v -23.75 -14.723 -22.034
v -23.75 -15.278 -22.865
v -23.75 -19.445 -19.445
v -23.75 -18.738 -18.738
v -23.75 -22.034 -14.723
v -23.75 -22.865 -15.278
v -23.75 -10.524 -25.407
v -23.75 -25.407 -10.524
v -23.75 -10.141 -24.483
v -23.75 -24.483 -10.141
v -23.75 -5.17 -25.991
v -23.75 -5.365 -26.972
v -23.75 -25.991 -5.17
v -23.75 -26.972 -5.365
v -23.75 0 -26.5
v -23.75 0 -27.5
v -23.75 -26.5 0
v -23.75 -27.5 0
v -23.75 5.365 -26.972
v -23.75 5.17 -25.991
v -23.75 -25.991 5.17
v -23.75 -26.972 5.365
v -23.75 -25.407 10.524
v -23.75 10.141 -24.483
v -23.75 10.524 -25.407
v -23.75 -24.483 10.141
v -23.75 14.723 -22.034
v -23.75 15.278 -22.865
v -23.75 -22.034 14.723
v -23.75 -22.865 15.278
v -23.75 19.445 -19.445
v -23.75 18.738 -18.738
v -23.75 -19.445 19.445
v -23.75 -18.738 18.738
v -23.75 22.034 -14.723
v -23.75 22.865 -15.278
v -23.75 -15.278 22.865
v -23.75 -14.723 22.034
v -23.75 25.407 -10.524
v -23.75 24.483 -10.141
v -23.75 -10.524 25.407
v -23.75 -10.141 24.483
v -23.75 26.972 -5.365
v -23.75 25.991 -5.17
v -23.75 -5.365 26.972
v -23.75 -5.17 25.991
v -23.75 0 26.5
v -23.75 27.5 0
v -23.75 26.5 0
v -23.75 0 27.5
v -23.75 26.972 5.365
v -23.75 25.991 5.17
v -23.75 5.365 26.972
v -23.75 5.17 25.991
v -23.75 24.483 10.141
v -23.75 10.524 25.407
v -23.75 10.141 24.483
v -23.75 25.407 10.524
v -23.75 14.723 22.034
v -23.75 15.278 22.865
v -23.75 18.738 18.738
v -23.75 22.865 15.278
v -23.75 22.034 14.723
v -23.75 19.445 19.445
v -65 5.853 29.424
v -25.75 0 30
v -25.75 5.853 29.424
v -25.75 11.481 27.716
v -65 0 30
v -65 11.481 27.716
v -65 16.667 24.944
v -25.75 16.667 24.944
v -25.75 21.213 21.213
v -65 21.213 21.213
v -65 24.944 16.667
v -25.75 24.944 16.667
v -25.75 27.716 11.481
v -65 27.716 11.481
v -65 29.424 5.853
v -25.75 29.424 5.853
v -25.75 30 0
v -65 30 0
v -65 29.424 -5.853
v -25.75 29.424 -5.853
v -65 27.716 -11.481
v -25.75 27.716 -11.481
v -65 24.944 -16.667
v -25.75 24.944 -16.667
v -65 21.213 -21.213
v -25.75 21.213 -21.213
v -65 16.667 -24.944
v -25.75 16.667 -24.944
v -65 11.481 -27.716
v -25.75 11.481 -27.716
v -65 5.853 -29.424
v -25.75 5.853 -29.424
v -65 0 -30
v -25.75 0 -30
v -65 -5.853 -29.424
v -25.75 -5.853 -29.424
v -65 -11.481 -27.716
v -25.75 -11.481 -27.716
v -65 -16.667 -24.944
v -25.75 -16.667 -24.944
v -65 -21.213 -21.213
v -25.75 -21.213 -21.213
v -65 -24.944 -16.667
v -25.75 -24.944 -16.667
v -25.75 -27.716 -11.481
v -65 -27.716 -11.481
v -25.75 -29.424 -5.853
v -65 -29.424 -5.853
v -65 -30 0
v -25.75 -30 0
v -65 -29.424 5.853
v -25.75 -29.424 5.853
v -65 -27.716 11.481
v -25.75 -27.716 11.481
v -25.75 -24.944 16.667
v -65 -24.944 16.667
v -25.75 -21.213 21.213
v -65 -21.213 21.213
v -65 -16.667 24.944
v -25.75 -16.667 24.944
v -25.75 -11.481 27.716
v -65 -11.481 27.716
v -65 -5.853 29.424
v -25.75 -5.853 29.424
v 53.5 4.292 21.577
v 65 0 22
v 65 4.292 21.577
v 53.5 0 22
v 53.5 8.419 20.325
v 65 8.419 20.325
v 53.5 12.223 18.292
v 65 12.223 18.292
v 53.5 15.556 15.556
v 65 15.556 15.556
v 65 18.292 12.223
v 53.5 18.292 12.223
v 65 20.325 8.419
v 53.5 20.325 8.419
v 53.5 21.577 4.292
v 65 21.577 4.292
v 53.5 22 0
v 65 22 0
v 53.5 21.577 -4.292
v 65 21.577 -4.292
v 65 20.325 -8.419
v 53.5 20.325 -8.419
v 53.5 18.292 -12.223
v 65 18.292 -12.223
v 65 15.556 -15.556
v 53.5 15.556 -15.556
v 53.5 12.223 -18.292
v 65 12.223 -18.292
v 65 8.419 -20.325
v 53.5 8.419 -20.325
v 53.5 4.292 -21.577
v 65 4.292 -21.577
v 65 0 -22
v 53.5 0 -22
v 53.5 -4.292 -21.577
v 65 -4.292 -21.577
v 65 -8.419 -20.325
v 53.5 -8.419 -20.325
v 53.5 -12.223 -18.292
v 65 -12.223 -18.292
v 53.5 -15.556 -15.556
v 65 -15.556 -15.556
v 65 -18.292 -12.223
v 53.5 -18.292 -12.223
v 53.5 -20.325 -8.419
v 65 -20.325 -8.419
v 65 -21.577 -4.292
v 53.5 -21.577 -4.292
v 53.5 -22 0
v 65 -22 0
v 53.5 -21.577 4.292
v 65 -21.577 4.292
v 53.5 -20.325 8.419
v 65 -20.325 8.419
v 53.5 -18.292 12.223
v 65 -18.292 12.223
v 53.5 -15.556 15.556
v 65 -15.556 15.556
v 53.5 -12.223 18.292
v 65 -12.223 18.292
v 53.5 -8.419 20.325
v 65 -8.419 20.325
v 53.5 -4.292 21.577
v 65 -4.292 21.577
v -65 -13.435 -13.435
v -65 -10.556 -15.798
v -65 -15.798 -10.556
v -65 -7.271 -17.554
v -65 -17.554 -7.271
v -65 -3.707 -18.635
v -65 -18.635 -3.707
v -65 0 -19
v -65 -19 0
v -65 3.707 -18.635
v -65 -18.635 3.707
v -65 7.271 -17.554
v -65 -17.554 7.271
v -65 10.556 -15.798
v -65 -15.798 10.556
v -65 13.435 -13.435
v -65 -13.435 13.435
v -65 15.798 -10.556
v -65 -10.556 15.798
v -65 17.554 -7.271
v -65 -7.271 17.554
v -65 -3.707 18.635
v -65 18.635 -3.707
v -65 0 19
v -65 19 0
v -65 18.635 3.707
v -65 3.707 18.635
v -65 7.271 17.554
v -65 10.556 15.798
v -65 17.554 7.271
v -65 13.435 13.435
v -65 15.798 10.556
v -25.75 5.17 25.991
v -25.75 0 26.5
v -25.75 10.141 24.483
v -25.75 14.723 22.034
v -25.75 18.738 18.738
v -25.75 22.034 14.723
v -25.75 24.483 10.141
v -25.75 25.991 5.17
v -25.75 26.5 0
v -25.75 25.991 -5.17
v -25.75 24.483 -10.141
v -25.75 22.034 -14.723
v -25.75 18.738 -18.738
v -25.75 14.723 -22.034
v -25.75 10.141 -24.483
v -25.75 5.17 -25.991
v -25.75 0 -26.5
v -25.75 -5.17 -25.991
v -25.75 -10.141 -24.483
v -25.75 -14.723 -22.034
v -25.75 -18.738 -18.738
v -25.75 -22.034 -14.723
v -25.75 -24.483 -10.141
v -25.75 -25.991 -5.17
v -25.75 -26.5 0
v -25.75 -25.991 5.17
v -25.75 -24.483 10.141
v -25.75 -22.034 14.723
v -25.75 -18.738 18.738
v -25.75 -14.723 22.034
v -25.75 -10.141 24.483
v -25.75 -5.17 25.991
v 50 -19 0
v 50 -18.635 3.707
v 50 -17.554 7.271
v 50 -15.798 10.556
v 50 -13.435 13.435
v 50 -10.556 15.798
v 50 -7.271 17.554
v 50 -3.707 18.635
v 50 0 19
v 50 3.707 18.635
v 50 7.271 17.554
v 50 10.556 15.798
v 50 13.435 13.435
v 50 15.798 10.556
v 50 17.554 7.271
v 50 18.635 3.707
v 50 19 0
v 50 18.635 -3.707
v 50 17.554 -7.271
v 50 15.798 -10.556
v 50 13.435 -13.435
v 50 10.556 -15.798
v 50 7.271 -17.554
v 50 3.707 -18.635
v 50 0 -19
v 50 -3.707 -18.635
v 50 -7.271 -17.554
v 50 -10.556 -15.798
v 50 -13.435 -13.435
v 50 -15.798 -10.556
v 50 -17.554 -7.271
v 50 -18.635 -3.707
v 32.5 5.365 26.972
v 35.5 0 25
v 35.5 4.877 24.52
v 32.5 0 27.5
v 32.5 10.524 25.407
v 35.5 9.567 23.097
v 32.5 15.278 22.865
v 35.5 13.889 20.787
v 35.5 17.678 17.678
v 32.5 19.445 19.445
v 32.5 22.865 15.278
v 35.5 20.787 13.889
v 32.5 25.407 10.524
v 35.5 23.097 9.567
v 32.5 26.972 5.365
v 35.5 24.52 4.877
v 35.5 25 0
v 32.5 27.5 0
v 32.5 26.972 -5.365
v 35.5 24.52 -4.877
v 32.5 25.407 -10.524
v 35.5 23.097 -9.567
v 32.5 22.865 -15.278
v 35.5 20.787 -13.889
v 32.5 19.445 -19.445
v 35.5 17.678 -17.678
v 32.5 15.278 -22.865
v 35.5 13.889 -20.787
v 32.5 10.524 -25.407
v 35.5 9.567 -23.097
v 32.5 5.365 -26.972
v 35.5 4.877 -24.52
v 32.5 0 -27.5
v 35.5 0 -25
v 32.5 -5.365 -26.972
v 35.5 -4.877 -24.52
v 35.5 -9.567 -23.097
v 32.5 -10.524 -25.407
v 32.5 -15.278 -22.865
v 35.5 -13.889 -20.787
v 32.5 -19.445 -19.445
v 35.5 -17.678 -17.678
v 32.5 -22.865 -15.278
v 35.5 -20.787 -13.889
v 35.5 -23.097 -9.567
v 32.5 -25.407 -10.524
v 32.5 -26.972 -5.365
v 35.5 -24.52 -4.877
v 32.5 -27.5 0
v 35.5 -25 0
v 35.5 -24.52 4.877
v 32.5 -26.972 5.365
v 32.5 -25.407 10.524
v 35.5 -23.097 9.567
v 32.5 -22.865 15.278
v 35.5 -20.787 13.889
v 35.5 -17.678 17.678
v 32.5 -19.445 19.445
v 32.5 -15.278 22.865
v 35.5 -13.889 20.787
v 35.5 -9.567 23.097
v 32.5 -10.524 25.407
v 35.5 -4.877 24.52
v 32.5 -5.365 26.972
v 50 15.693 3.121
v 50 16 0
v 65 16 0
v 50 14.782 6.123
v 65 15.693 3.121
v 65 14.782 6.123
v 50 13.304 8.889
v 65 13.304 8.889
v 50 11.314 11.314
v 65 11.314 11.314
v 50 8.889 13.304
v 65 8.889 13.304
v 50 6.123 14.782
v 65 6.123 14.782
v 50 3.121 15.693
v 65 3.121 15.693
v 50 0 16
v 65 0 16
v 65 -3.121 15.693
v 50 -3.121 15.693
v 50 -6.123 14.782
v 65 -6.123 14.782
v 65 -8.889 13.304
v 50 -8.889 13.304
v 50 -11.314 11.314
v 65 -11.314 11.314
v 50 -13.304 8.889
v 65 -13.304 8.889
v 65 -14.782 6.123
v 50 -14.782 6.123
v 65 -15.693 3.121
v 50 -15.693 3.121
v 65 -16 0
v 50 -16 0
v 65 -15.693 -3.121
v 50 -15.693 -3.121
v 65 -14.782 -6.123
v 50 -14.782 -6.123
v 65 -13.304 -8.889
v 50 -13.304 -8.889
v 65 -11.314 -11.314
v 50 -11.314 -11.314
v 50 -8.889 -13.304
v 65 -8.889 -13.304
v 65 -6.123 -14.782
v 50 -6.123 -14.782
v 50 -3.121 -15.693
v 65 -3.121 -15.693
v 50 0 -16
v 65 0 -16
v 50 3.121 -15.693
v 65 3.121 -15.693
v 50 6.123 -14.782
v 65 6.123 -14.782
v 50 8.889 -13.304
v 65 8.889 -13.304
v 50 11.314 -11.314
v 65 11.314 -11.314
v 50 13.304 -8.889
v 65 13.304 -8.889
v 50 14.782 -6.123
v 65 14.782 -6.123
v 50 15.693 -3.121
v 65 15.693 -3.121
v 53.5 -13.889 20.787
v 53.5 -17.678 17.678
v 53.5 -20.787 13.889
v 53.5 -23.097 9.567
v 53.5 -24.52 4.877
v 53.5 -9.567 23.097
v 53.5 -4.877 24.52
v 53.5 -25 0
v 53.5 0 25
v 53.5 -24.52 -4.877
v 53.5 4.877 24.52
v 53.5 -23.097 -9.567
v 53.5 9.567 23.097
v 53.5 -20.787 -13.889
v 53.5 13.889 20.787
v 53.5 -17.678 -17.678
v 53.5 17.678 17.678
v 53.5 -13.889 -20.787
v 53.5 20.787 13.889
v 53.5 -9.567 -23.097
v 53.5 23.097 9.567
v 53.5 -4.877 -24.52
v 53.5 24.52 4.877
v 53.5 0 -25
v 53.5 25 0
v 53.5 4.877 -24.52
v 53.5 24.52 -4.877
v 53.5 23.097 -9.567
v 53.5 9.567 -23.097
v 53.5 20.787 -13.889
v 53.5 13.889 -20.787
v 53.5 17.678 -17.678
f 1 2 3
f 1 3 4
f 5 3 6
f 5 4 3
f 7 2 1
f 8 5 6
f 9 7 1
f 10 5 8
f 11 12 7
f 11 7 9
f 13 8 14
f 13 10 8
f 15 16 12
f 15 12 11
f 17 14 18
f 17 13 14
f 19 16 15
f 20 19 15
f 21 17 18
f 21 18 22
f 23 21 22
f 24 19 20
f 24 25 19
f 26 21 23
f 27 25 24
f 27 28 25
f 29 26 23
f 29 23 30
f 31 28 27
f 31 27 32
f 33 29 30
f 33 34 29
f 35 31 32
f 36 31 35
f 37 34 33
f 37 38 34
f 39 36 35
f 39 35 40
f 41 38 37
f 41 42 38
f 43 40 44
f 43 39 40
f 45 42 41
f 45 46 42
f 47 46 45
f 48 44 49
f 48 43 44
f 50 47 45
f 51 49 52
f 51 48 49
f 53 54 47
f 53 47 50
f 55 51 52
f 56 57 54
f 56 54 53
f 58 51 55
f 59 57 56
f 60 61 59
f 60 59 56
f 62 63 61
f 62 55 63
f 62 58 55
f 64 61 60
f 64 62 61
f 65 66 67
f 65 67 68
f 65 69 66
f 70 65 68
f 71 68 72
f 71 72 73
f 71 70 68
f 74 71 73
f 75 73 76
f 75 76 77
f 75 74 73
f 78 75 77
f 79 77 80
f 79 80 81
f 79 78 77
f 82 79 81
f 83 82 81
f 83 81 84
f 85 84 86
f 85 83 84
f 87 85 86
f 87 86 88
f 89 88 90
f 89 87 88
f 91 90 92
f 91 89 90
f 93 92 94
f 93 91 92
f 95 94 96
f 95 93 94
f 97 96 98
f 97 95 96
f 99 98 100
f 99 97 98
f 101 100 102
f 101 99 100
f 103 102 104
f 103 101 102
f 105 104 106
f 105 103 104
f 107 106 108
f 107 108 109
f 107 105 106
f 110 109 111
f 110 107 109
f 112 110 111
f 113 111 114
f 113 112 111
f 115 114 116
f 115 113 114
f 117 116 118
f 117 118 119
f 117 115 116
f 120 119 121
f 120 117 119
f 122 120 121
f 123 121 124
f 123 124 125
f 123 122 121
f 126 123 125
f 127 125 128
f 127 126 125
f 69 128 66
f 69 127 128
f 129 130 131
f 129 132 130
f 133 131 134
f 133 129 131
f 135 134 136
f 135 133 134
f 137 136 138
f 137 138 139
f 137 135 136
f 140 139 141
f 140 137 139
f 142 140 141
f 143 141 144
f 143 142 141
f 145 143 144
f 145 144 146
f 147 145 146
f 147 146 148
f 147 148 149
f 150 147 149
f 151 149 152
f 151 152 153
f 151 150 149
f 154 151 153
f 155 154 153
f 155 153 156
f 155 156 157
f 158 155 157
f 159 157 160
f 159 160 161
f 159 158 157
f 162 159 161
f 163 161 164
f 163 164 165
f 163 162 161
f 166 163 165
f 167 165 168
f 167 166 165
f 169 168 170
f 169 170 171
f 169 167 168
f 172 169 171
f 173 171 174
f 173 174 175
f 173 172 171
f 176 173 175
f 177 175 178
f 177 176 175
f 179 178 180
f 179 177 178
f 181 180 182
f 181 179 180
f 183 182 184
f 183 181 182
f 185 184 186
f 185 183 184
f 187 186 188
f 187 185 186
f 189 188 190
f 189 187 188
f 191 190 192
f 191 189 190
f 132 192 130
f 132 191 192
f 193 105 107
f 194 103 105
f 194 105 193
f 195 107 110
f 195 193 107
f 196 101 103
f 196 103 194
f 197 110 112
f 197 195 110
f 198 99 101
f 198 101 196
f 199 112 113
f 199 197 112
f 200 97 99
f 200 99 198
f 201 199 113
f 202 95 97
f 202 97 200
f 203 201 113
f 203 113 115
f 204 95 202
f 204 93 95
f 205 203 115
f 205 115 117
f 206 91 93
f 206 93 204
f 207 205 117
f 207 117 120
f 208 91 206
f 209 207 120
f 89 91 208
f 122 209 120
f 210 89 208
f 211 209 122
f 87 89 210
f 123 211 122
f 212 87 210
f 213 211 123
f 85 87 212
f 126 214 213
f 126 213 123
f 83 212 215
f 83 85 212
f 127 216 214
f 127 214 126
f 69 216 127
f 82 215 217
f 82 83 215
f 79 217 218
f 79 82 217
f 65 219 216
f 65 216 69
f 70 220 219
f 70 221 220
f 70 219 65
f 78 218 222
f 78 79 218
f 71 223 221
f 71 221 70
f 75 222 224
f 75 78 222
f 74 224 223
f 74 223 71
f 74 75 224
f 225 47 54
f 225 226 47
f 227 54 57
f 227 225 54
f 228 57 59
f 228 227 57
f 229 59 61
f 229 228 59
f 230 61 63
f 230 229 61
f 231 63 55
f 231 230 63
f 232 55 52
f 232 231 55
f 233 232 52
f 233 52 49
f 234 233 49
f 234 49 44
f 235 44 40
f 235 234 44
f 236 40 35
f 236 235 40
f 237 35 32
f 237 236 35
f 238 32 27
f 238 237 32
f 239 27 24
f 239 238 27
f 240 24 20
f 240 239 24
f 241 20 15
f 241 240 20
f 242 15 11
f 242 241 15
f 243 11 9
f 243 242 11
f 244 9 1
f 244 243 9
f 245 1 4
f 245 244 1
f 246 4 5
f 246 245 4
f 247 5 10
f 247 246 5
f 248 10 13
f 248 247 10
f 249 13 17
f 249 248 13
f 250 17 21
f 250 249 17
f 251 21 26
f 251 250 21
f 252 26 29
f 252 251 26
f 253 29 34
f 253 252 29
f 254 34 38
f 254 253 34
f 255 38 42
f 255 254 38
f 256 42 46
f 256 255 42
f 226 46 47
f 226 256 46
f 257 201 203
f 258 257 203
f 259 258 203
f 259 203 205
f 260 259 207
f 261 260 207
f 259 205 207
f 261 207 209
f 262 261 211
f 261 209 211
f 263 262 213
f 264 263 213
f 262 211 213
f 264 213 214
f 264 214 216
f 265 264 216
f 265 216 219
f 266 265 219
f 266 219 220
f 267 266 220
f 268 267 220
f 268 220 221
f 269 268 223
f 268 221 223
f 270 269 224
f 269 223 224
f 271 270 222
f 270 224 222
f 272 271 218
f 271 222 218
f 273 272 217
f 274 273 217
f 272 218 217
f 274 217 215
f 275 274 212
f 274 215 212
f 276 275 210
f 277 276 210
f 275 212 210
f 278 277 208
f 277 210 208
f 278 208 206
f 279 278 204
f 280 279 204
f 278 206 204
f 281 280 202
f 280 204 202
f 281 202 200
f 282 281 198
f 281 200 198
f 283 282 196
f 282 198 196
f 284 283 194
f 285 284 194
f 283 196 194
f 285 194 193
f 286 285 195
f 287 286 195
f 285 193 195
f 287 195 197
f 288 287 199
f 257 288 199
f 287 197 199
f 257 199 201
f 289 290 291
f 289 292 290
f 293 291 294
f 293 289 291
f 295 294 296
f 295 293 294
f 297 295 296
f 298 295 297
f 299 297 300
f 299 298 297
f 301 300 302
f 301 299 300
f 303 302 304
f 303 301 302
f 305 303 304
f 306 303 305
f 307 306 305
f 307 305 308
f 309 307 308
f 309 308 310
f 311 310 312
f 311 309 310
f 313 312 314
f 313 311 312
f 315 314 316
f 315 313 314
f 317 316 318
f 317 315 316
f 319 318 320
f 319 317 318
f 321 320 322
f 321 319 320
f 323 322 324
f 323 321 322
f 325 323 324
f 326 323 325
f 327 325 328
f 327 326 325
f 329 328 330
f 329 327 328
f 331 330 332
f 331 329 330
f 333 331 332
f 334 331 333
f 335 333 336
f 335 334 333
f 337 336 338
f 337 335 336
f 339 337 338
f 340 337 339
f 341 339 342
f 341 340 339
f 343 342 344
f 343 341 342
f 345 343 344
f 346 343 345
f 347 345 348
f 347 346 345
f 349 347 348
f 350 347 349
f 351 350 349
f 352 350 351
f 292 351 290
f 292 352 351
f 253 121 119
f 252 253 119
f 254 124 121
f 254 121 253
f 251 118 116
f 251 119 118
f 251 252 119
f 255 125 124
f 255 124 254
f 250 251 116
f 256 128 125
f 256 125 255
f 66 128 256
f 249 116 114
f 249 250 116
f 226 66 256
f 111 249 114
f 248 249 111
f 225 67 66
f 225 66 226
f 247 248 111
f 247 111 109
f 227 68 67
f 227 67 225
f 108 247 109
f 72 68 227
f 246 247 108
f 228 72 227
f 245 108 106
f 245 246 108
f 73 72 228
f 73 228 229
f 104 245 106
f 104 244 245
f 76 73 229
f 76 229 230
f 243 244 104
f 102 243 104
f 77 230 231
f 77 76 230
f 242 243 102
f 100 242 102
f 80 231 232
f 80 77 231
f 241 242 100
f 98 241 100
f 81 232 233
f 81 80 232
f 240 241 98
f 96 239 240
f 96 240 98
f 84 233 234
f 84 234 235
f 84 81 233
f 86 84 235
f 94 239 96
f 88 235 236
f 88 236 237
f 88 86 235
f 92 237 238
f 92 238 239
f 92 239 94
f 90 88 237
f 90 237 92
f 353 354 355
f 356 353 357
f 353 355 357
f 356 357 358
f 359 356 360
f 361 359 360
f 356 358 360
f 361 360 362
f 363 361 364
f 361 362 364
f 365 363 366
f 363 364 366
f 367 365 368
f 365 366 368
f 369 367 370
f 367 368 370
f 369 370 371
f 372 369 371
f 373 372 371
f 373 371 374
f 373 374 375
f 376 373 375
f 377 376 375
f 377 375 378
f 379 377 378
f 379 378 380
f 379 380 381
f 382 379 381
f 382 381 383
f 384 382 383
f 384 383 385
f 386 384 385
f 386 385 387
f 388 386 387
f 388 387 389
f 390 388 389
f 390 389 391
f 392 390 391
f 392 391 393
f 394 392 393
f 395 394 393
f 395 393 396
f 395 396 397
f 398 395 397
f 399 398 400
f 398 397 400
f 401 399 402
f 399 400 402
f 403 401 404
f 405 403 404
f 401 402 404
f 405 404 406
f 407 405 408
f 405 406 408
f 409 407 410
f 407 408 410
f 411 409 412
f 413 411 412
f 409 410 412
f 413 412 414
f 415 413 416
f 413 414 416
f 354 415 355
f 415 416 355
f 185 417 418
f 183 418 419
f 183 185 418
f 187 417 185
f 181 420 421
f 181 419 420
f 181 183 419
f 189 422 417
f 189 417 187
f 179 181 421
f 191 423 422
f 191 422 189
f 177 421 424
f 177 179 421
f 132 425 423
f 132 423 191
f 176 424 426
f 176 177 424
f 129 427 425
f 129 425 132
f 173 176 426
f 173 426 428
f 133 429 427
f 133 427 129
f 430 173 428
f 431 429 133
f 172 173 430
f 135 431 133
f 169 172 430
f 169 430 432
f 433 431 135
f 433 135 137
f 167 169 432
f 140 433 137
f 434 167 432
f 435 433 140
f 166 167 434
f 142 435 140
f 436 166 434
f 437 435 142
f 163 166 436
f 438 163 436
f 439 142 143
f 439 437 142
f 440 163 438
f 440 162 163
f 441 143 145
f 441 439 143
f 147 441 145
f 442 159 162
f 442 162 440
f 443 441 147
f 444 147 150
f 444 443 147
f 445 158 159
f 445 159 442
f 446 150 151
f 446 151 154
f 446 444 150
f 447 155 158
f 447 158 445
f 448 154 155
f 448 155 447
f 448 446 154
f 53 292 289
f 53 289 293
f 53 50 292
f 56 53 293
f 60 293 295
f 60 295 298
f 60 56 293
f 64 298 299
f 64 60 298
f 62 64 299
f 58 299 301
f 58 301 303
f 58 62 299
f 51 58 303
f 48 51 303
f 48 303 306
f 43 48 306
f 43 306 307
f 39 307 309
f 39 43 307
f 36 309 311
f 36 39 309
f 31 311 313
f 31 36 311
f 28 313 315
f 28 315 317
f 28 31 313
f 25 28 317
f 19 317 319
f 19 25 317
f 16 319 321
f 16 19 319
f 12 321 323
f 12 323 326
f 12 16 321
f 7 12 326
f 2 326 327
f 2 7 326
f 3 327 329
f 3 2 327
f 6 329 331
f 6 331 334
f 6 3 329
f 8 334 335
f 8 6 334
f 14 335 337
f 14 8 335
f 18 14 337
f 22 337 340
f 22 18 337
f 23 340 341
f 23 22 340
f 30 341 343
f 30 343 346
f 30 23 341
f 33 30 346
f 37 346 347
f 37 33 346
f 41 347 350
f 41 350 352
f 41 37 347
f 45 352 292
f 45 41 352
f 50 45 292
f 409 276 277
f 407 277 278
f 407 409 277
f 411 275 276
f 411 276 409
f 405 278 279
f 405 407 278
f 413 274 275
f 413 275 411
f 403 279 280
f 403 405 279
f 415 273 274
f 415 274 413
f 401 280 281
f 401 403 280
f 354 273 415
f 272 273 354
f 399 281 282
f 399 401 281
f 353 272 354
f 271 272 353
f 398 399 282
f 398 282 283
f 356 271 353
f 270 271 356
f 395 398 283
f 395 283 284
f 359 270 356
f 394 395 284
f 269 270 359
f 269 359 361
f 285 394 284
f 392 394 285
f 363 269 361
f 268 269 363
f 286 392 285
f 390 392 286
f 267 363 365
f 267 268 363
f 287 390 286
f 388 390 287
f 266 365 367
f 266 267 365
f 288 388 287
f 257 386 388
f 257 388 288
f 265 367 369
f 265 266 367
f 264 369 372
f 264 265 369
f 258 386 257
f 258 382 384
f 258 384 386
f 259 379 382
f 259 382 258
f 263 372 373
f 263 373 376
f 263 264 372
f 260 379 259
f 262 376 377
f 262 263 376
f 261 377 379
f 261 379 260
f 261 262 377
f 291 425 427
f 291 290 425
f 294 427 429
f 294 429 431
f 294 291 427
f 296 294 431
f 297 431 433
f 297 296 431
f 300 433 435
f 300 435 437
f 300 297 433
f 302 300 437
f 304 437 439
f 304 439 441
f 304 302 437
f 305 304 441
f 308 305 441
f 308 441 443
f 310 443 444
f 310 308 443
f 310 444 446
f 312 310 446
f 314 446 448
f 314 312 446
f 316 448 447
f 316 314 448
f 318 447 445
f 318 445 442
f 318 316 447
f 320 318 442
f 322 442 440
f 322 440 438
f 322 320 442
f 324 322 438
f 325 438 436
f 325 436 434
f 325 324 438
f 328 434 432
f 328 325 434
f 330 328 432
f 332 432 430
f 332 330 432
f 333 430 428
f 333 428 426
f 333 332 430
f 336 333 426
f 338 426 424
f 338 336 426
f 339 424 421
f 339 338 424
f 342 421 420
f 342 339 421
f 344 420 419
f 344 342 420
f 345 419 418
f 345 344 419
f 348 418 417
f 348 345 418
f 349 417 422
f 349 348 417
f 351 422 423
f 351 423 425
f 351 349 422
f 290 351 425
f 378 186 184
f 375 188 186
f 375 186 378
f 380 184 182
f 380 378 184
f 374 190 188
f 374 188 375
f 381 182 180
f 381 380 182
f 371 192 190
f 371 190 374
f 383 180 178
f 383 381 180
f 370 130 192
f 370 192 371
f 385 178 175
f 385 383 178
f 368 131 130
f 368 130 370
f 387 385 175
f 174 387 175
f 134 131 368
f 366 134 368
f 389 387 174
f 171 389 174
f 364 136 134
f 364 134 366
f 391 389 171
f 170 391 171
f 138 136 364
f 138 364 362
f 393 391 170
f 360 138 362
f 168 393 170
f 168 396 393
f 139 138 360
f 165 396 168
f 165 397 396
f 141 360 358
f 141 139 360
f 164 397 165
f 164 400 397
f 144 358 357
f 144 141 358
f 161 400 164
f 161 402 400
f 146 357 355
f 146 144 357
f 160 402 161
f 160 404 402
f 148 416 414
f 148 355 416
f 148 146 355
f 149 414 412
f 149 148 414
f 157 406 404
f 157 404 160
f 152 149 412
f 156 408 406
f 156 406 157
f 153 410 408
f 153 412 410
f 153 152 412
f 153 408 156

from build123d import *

# Parameters (mm, degrees)
F2_R     = 16
F3_DEPTH = 130
F4_R     = 19
F5_DEPTH = 115


with BuildPart() as f1:
    # F0 (on Front) → F1 (revolve)
    with BuildSketch(Plane.XZ):
        Polygon((-65, 30), (-65, 0), (65, 0), (65, 22), (53.5, 22), (53.5, 25), (35.5, 25), (32.5, 27.5), (-23.75, 27.5), (-23.75, 26.5), (-25.75, 26.5), (-25.75, 30), align=None)
    revolve(axis=Axis((0, 0, 0), (-1, 0, 0)))

    # F2 (on face) → F3 (cut, through all)
    with BuildSketch(Plane.YZ.offset(65)):
        Circle(F2_R)
    extrude(amount=-F3_DEPTH, mode=Mode.SUBTRACT)

    # F4 (on face) → F5 (cut)
    with BuildSketch(Plane(origin=(-65, 0, 0), x_dir=(0, -1, 0), z_dir=(-1, 0, 0))):
        Circle(F4_R)
    extrude(amount=-F5_DEPTH, mode=Mode.SUBTRACT)


solid = f1.part
